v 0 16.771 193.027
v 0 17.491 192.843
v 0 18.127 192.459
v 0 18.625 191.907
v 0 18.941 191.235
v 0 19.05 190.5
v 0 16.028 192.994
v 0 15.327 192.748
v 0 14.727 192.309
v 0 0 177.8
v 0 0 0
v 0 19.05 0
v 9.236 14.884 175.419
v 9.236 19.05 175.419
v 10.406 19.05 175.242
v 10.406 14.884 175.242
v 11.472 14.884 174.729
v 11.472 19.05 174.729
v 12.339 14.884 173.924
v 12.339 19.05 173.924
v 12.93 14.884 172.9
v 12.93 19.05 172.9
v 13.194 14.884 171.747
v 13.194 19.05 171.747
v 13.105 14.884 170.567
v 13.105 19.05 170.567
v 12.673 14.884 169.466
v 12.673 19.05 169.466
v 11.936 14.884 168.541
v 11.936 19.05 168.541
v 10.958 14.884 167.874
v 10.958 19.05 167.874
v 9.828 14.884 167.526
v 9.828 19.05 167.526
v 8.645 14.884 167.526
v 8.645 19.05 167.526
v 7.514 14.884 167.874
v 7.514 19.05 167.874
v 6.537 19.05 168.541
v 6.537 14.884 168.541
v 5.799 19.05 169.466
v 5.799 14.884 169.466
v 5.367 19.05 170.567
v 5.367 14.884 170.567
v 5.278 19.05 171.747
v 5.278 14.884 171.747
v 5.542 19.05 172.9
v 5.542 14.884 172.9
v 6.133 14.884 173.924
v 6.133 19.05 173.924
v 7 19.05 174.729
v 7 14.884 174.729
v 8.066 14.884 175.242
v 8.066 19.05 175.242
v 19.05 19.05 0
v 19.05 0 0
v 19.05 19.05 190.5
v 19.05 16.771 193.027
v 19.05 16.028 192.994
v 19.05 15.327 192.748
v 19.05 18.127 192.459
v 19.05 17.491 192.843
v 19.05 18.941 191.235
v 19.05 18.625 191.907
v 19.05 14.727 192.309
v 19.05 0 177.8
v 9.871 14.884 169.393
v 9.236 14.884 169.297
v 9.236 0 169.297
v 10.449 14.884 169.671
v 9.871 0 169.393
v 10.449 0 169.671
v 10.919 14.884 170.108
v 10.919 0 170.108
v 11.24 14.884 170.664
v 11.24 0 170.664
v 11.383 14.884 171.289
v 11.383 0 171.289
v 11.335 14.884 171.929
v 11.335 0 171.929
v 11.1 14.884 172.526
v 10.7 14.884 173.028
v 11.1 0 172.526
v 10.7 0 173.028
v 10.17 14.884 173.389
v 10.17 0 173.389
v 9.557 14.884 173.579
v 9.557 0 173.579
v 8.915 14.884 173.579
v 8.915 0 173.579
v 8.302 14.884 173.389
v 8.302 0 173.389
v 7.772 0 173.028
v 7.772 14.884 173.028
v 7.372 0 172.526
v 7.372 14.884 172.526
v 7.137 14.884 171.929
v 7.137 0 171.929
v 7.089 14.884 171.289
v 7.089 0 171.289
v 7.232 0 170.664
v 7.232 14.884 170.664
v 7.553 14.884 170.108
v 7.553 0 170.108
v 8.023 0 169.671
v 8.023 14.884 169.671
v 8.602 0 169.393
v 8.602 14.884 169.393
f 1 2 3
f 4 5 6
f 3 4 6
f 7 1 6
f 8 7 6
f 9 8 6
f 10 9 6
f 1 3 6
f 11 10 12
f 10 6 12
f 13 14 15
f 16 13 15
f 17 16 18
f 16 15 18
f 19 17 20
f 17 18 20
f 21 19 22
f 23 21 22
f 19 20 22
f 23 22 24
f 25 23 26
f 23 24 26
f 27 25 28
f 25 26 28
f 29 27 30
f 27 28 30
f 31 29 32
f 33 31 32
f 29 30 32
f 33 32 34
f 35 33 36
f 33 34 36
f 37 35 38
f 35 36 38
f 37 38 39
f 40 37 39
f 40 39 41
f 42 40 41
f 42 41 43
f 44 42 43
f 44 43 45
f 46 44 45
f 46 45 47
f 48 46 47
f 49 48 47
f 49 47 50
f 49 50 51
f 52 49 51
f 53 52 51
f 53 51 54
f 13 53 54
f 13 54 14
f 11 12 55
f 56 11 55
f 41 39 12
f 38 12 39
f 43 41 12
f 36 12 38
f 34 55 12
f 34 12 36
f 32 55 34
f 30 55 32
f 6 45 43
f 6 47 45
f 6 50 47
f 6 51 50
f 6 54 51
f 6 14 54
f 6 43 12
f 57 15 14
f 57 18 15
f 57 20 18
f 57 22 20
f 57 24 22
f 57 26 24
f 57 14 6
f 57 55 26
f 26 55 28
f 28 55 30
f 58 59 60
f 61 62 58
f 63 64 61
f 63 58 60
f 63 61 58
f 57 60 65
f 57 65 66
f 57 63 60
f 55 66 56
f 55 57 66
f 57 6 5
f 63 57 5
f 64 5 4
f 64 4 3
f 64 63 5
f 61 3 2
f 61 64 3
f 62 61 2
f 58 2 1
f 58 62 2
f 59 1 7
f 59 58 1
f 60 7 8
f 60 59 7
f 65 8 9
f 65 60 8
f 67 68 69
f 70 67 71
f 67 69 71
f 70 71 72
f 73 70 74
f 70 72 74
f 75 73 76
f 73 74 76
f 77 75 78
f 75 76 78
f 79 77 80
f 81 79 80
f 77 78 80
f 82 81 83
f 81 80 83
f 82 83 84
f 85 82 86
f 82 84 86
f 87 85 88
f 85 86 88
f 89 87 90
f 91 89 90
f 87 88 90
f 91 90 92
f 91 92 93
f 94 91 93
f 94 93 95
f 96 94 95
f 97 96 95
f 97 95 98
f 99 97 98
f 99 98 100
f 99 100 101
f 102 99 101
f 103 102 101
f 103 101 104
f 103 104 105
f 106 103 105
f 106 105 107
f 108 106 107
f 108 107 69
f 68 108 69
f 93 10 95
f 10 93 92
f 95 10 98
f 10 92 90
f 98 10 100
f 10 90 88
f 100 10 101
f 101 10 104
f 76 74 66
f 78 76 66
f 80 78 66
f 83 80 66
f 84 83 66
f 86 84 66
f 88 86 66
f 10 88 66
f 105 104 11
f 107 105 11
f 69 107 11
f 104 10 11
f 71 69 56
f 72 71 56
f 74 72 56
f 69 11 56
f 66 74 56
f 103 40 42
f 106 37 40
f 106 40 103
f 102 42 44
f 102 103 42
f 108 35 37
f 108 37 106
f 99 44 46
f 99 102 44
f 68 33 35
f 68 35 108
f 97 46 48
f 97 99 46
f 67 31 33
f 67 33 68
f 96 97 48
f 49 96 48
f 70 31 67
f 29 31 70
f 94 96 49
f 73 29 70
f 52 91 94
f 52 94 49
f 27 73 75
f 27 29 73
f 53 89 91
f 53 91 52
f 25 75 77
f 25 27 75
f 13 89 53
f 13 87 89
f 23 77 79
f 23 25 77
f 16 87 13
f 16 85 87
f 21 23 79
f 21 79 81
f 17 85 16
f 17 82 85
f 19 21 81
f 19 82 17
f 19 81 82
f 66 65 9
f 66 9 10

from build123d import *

# Parameters (mm, degrees)
SKETCH1_W                                      = 19.05
SKETCH1_H                                      = 19.05
BOSS_EXTRUDE1_DEPTH                            = 177.8
BOSS_EXTRUDE2_DEPTH                            = 19.05
CBORE_FOR_8_SOCKET_HEAD_CAP_SCREW1_D           = 4.3053
CBORE_FOR_8_SOCKET_HEAD_CAP_SCREW1_DEPTH       = 19.05
CBORE_FOR_8_SOCKET_HEAD_CAP_SCREW1_CBORE_D     = 7.9375
CBORE_FOR_8_SOCKET_HEAD_CAP_SCREW1_CBORE_DEPTH = 4.1656


with BuildPart() as part:
    # Sketch1 → Boss-Extrude1 (new body)
    with BuildSketch(Plane.XY):
        with Locations((9.525, 9.525)):
            Rectangle(SKETCH1_W, SKETCH1_H)
    extrude(amount=BOSS_EXTRUDE1_DEPTH)

    # Sketch2 → Boss-Extrude2 (add)
    with BuildSketch(Plane(origin=(19.05, 0, 0), x_dir=(0, 0, -1), z_dir=(1, 0, 0))):
        with BuildLine():
            Line((-177.8, 19.05), (-190.5, 19.05))
            ThreePointArc((-190.5, 19.05), (-192.843013973, 17.490757626), (-192.309392774, 14.727390174))
            Line((-192.309392774, 14.727390174), (-177.8, 0))
            Line((-177.8, 0), (-177.8, 19.05))
        make_face()
    extrude(amount=-BOSS_EXTRUDE2_DEPTH)

    # CBORE for #8 Socket Head Cap Screw1
    with Locations(Plane(origin=(9.23608704, 19.05, 171.45), x_dir=(0, 0, 1), z_dir=(0, 1, 0))):
        with Locations((0, 0)):
            CounterBoreHole(CBORE_FOR_8_SOCKET_HEAD_CAP_SCREW1_D / 2, CBORE_FOR_8_SOCKET_HEAD_CAP_SCREW1_CBORE_D / 2, CBORE_FOR_8_SOCKET_HEAD_CAP_SCREW1_CBORE_DEPTH, depth=CBORE_FOR_8_SOCKET_HEAD_CAP_SCREW1_DEPTH)


solid = part.part
